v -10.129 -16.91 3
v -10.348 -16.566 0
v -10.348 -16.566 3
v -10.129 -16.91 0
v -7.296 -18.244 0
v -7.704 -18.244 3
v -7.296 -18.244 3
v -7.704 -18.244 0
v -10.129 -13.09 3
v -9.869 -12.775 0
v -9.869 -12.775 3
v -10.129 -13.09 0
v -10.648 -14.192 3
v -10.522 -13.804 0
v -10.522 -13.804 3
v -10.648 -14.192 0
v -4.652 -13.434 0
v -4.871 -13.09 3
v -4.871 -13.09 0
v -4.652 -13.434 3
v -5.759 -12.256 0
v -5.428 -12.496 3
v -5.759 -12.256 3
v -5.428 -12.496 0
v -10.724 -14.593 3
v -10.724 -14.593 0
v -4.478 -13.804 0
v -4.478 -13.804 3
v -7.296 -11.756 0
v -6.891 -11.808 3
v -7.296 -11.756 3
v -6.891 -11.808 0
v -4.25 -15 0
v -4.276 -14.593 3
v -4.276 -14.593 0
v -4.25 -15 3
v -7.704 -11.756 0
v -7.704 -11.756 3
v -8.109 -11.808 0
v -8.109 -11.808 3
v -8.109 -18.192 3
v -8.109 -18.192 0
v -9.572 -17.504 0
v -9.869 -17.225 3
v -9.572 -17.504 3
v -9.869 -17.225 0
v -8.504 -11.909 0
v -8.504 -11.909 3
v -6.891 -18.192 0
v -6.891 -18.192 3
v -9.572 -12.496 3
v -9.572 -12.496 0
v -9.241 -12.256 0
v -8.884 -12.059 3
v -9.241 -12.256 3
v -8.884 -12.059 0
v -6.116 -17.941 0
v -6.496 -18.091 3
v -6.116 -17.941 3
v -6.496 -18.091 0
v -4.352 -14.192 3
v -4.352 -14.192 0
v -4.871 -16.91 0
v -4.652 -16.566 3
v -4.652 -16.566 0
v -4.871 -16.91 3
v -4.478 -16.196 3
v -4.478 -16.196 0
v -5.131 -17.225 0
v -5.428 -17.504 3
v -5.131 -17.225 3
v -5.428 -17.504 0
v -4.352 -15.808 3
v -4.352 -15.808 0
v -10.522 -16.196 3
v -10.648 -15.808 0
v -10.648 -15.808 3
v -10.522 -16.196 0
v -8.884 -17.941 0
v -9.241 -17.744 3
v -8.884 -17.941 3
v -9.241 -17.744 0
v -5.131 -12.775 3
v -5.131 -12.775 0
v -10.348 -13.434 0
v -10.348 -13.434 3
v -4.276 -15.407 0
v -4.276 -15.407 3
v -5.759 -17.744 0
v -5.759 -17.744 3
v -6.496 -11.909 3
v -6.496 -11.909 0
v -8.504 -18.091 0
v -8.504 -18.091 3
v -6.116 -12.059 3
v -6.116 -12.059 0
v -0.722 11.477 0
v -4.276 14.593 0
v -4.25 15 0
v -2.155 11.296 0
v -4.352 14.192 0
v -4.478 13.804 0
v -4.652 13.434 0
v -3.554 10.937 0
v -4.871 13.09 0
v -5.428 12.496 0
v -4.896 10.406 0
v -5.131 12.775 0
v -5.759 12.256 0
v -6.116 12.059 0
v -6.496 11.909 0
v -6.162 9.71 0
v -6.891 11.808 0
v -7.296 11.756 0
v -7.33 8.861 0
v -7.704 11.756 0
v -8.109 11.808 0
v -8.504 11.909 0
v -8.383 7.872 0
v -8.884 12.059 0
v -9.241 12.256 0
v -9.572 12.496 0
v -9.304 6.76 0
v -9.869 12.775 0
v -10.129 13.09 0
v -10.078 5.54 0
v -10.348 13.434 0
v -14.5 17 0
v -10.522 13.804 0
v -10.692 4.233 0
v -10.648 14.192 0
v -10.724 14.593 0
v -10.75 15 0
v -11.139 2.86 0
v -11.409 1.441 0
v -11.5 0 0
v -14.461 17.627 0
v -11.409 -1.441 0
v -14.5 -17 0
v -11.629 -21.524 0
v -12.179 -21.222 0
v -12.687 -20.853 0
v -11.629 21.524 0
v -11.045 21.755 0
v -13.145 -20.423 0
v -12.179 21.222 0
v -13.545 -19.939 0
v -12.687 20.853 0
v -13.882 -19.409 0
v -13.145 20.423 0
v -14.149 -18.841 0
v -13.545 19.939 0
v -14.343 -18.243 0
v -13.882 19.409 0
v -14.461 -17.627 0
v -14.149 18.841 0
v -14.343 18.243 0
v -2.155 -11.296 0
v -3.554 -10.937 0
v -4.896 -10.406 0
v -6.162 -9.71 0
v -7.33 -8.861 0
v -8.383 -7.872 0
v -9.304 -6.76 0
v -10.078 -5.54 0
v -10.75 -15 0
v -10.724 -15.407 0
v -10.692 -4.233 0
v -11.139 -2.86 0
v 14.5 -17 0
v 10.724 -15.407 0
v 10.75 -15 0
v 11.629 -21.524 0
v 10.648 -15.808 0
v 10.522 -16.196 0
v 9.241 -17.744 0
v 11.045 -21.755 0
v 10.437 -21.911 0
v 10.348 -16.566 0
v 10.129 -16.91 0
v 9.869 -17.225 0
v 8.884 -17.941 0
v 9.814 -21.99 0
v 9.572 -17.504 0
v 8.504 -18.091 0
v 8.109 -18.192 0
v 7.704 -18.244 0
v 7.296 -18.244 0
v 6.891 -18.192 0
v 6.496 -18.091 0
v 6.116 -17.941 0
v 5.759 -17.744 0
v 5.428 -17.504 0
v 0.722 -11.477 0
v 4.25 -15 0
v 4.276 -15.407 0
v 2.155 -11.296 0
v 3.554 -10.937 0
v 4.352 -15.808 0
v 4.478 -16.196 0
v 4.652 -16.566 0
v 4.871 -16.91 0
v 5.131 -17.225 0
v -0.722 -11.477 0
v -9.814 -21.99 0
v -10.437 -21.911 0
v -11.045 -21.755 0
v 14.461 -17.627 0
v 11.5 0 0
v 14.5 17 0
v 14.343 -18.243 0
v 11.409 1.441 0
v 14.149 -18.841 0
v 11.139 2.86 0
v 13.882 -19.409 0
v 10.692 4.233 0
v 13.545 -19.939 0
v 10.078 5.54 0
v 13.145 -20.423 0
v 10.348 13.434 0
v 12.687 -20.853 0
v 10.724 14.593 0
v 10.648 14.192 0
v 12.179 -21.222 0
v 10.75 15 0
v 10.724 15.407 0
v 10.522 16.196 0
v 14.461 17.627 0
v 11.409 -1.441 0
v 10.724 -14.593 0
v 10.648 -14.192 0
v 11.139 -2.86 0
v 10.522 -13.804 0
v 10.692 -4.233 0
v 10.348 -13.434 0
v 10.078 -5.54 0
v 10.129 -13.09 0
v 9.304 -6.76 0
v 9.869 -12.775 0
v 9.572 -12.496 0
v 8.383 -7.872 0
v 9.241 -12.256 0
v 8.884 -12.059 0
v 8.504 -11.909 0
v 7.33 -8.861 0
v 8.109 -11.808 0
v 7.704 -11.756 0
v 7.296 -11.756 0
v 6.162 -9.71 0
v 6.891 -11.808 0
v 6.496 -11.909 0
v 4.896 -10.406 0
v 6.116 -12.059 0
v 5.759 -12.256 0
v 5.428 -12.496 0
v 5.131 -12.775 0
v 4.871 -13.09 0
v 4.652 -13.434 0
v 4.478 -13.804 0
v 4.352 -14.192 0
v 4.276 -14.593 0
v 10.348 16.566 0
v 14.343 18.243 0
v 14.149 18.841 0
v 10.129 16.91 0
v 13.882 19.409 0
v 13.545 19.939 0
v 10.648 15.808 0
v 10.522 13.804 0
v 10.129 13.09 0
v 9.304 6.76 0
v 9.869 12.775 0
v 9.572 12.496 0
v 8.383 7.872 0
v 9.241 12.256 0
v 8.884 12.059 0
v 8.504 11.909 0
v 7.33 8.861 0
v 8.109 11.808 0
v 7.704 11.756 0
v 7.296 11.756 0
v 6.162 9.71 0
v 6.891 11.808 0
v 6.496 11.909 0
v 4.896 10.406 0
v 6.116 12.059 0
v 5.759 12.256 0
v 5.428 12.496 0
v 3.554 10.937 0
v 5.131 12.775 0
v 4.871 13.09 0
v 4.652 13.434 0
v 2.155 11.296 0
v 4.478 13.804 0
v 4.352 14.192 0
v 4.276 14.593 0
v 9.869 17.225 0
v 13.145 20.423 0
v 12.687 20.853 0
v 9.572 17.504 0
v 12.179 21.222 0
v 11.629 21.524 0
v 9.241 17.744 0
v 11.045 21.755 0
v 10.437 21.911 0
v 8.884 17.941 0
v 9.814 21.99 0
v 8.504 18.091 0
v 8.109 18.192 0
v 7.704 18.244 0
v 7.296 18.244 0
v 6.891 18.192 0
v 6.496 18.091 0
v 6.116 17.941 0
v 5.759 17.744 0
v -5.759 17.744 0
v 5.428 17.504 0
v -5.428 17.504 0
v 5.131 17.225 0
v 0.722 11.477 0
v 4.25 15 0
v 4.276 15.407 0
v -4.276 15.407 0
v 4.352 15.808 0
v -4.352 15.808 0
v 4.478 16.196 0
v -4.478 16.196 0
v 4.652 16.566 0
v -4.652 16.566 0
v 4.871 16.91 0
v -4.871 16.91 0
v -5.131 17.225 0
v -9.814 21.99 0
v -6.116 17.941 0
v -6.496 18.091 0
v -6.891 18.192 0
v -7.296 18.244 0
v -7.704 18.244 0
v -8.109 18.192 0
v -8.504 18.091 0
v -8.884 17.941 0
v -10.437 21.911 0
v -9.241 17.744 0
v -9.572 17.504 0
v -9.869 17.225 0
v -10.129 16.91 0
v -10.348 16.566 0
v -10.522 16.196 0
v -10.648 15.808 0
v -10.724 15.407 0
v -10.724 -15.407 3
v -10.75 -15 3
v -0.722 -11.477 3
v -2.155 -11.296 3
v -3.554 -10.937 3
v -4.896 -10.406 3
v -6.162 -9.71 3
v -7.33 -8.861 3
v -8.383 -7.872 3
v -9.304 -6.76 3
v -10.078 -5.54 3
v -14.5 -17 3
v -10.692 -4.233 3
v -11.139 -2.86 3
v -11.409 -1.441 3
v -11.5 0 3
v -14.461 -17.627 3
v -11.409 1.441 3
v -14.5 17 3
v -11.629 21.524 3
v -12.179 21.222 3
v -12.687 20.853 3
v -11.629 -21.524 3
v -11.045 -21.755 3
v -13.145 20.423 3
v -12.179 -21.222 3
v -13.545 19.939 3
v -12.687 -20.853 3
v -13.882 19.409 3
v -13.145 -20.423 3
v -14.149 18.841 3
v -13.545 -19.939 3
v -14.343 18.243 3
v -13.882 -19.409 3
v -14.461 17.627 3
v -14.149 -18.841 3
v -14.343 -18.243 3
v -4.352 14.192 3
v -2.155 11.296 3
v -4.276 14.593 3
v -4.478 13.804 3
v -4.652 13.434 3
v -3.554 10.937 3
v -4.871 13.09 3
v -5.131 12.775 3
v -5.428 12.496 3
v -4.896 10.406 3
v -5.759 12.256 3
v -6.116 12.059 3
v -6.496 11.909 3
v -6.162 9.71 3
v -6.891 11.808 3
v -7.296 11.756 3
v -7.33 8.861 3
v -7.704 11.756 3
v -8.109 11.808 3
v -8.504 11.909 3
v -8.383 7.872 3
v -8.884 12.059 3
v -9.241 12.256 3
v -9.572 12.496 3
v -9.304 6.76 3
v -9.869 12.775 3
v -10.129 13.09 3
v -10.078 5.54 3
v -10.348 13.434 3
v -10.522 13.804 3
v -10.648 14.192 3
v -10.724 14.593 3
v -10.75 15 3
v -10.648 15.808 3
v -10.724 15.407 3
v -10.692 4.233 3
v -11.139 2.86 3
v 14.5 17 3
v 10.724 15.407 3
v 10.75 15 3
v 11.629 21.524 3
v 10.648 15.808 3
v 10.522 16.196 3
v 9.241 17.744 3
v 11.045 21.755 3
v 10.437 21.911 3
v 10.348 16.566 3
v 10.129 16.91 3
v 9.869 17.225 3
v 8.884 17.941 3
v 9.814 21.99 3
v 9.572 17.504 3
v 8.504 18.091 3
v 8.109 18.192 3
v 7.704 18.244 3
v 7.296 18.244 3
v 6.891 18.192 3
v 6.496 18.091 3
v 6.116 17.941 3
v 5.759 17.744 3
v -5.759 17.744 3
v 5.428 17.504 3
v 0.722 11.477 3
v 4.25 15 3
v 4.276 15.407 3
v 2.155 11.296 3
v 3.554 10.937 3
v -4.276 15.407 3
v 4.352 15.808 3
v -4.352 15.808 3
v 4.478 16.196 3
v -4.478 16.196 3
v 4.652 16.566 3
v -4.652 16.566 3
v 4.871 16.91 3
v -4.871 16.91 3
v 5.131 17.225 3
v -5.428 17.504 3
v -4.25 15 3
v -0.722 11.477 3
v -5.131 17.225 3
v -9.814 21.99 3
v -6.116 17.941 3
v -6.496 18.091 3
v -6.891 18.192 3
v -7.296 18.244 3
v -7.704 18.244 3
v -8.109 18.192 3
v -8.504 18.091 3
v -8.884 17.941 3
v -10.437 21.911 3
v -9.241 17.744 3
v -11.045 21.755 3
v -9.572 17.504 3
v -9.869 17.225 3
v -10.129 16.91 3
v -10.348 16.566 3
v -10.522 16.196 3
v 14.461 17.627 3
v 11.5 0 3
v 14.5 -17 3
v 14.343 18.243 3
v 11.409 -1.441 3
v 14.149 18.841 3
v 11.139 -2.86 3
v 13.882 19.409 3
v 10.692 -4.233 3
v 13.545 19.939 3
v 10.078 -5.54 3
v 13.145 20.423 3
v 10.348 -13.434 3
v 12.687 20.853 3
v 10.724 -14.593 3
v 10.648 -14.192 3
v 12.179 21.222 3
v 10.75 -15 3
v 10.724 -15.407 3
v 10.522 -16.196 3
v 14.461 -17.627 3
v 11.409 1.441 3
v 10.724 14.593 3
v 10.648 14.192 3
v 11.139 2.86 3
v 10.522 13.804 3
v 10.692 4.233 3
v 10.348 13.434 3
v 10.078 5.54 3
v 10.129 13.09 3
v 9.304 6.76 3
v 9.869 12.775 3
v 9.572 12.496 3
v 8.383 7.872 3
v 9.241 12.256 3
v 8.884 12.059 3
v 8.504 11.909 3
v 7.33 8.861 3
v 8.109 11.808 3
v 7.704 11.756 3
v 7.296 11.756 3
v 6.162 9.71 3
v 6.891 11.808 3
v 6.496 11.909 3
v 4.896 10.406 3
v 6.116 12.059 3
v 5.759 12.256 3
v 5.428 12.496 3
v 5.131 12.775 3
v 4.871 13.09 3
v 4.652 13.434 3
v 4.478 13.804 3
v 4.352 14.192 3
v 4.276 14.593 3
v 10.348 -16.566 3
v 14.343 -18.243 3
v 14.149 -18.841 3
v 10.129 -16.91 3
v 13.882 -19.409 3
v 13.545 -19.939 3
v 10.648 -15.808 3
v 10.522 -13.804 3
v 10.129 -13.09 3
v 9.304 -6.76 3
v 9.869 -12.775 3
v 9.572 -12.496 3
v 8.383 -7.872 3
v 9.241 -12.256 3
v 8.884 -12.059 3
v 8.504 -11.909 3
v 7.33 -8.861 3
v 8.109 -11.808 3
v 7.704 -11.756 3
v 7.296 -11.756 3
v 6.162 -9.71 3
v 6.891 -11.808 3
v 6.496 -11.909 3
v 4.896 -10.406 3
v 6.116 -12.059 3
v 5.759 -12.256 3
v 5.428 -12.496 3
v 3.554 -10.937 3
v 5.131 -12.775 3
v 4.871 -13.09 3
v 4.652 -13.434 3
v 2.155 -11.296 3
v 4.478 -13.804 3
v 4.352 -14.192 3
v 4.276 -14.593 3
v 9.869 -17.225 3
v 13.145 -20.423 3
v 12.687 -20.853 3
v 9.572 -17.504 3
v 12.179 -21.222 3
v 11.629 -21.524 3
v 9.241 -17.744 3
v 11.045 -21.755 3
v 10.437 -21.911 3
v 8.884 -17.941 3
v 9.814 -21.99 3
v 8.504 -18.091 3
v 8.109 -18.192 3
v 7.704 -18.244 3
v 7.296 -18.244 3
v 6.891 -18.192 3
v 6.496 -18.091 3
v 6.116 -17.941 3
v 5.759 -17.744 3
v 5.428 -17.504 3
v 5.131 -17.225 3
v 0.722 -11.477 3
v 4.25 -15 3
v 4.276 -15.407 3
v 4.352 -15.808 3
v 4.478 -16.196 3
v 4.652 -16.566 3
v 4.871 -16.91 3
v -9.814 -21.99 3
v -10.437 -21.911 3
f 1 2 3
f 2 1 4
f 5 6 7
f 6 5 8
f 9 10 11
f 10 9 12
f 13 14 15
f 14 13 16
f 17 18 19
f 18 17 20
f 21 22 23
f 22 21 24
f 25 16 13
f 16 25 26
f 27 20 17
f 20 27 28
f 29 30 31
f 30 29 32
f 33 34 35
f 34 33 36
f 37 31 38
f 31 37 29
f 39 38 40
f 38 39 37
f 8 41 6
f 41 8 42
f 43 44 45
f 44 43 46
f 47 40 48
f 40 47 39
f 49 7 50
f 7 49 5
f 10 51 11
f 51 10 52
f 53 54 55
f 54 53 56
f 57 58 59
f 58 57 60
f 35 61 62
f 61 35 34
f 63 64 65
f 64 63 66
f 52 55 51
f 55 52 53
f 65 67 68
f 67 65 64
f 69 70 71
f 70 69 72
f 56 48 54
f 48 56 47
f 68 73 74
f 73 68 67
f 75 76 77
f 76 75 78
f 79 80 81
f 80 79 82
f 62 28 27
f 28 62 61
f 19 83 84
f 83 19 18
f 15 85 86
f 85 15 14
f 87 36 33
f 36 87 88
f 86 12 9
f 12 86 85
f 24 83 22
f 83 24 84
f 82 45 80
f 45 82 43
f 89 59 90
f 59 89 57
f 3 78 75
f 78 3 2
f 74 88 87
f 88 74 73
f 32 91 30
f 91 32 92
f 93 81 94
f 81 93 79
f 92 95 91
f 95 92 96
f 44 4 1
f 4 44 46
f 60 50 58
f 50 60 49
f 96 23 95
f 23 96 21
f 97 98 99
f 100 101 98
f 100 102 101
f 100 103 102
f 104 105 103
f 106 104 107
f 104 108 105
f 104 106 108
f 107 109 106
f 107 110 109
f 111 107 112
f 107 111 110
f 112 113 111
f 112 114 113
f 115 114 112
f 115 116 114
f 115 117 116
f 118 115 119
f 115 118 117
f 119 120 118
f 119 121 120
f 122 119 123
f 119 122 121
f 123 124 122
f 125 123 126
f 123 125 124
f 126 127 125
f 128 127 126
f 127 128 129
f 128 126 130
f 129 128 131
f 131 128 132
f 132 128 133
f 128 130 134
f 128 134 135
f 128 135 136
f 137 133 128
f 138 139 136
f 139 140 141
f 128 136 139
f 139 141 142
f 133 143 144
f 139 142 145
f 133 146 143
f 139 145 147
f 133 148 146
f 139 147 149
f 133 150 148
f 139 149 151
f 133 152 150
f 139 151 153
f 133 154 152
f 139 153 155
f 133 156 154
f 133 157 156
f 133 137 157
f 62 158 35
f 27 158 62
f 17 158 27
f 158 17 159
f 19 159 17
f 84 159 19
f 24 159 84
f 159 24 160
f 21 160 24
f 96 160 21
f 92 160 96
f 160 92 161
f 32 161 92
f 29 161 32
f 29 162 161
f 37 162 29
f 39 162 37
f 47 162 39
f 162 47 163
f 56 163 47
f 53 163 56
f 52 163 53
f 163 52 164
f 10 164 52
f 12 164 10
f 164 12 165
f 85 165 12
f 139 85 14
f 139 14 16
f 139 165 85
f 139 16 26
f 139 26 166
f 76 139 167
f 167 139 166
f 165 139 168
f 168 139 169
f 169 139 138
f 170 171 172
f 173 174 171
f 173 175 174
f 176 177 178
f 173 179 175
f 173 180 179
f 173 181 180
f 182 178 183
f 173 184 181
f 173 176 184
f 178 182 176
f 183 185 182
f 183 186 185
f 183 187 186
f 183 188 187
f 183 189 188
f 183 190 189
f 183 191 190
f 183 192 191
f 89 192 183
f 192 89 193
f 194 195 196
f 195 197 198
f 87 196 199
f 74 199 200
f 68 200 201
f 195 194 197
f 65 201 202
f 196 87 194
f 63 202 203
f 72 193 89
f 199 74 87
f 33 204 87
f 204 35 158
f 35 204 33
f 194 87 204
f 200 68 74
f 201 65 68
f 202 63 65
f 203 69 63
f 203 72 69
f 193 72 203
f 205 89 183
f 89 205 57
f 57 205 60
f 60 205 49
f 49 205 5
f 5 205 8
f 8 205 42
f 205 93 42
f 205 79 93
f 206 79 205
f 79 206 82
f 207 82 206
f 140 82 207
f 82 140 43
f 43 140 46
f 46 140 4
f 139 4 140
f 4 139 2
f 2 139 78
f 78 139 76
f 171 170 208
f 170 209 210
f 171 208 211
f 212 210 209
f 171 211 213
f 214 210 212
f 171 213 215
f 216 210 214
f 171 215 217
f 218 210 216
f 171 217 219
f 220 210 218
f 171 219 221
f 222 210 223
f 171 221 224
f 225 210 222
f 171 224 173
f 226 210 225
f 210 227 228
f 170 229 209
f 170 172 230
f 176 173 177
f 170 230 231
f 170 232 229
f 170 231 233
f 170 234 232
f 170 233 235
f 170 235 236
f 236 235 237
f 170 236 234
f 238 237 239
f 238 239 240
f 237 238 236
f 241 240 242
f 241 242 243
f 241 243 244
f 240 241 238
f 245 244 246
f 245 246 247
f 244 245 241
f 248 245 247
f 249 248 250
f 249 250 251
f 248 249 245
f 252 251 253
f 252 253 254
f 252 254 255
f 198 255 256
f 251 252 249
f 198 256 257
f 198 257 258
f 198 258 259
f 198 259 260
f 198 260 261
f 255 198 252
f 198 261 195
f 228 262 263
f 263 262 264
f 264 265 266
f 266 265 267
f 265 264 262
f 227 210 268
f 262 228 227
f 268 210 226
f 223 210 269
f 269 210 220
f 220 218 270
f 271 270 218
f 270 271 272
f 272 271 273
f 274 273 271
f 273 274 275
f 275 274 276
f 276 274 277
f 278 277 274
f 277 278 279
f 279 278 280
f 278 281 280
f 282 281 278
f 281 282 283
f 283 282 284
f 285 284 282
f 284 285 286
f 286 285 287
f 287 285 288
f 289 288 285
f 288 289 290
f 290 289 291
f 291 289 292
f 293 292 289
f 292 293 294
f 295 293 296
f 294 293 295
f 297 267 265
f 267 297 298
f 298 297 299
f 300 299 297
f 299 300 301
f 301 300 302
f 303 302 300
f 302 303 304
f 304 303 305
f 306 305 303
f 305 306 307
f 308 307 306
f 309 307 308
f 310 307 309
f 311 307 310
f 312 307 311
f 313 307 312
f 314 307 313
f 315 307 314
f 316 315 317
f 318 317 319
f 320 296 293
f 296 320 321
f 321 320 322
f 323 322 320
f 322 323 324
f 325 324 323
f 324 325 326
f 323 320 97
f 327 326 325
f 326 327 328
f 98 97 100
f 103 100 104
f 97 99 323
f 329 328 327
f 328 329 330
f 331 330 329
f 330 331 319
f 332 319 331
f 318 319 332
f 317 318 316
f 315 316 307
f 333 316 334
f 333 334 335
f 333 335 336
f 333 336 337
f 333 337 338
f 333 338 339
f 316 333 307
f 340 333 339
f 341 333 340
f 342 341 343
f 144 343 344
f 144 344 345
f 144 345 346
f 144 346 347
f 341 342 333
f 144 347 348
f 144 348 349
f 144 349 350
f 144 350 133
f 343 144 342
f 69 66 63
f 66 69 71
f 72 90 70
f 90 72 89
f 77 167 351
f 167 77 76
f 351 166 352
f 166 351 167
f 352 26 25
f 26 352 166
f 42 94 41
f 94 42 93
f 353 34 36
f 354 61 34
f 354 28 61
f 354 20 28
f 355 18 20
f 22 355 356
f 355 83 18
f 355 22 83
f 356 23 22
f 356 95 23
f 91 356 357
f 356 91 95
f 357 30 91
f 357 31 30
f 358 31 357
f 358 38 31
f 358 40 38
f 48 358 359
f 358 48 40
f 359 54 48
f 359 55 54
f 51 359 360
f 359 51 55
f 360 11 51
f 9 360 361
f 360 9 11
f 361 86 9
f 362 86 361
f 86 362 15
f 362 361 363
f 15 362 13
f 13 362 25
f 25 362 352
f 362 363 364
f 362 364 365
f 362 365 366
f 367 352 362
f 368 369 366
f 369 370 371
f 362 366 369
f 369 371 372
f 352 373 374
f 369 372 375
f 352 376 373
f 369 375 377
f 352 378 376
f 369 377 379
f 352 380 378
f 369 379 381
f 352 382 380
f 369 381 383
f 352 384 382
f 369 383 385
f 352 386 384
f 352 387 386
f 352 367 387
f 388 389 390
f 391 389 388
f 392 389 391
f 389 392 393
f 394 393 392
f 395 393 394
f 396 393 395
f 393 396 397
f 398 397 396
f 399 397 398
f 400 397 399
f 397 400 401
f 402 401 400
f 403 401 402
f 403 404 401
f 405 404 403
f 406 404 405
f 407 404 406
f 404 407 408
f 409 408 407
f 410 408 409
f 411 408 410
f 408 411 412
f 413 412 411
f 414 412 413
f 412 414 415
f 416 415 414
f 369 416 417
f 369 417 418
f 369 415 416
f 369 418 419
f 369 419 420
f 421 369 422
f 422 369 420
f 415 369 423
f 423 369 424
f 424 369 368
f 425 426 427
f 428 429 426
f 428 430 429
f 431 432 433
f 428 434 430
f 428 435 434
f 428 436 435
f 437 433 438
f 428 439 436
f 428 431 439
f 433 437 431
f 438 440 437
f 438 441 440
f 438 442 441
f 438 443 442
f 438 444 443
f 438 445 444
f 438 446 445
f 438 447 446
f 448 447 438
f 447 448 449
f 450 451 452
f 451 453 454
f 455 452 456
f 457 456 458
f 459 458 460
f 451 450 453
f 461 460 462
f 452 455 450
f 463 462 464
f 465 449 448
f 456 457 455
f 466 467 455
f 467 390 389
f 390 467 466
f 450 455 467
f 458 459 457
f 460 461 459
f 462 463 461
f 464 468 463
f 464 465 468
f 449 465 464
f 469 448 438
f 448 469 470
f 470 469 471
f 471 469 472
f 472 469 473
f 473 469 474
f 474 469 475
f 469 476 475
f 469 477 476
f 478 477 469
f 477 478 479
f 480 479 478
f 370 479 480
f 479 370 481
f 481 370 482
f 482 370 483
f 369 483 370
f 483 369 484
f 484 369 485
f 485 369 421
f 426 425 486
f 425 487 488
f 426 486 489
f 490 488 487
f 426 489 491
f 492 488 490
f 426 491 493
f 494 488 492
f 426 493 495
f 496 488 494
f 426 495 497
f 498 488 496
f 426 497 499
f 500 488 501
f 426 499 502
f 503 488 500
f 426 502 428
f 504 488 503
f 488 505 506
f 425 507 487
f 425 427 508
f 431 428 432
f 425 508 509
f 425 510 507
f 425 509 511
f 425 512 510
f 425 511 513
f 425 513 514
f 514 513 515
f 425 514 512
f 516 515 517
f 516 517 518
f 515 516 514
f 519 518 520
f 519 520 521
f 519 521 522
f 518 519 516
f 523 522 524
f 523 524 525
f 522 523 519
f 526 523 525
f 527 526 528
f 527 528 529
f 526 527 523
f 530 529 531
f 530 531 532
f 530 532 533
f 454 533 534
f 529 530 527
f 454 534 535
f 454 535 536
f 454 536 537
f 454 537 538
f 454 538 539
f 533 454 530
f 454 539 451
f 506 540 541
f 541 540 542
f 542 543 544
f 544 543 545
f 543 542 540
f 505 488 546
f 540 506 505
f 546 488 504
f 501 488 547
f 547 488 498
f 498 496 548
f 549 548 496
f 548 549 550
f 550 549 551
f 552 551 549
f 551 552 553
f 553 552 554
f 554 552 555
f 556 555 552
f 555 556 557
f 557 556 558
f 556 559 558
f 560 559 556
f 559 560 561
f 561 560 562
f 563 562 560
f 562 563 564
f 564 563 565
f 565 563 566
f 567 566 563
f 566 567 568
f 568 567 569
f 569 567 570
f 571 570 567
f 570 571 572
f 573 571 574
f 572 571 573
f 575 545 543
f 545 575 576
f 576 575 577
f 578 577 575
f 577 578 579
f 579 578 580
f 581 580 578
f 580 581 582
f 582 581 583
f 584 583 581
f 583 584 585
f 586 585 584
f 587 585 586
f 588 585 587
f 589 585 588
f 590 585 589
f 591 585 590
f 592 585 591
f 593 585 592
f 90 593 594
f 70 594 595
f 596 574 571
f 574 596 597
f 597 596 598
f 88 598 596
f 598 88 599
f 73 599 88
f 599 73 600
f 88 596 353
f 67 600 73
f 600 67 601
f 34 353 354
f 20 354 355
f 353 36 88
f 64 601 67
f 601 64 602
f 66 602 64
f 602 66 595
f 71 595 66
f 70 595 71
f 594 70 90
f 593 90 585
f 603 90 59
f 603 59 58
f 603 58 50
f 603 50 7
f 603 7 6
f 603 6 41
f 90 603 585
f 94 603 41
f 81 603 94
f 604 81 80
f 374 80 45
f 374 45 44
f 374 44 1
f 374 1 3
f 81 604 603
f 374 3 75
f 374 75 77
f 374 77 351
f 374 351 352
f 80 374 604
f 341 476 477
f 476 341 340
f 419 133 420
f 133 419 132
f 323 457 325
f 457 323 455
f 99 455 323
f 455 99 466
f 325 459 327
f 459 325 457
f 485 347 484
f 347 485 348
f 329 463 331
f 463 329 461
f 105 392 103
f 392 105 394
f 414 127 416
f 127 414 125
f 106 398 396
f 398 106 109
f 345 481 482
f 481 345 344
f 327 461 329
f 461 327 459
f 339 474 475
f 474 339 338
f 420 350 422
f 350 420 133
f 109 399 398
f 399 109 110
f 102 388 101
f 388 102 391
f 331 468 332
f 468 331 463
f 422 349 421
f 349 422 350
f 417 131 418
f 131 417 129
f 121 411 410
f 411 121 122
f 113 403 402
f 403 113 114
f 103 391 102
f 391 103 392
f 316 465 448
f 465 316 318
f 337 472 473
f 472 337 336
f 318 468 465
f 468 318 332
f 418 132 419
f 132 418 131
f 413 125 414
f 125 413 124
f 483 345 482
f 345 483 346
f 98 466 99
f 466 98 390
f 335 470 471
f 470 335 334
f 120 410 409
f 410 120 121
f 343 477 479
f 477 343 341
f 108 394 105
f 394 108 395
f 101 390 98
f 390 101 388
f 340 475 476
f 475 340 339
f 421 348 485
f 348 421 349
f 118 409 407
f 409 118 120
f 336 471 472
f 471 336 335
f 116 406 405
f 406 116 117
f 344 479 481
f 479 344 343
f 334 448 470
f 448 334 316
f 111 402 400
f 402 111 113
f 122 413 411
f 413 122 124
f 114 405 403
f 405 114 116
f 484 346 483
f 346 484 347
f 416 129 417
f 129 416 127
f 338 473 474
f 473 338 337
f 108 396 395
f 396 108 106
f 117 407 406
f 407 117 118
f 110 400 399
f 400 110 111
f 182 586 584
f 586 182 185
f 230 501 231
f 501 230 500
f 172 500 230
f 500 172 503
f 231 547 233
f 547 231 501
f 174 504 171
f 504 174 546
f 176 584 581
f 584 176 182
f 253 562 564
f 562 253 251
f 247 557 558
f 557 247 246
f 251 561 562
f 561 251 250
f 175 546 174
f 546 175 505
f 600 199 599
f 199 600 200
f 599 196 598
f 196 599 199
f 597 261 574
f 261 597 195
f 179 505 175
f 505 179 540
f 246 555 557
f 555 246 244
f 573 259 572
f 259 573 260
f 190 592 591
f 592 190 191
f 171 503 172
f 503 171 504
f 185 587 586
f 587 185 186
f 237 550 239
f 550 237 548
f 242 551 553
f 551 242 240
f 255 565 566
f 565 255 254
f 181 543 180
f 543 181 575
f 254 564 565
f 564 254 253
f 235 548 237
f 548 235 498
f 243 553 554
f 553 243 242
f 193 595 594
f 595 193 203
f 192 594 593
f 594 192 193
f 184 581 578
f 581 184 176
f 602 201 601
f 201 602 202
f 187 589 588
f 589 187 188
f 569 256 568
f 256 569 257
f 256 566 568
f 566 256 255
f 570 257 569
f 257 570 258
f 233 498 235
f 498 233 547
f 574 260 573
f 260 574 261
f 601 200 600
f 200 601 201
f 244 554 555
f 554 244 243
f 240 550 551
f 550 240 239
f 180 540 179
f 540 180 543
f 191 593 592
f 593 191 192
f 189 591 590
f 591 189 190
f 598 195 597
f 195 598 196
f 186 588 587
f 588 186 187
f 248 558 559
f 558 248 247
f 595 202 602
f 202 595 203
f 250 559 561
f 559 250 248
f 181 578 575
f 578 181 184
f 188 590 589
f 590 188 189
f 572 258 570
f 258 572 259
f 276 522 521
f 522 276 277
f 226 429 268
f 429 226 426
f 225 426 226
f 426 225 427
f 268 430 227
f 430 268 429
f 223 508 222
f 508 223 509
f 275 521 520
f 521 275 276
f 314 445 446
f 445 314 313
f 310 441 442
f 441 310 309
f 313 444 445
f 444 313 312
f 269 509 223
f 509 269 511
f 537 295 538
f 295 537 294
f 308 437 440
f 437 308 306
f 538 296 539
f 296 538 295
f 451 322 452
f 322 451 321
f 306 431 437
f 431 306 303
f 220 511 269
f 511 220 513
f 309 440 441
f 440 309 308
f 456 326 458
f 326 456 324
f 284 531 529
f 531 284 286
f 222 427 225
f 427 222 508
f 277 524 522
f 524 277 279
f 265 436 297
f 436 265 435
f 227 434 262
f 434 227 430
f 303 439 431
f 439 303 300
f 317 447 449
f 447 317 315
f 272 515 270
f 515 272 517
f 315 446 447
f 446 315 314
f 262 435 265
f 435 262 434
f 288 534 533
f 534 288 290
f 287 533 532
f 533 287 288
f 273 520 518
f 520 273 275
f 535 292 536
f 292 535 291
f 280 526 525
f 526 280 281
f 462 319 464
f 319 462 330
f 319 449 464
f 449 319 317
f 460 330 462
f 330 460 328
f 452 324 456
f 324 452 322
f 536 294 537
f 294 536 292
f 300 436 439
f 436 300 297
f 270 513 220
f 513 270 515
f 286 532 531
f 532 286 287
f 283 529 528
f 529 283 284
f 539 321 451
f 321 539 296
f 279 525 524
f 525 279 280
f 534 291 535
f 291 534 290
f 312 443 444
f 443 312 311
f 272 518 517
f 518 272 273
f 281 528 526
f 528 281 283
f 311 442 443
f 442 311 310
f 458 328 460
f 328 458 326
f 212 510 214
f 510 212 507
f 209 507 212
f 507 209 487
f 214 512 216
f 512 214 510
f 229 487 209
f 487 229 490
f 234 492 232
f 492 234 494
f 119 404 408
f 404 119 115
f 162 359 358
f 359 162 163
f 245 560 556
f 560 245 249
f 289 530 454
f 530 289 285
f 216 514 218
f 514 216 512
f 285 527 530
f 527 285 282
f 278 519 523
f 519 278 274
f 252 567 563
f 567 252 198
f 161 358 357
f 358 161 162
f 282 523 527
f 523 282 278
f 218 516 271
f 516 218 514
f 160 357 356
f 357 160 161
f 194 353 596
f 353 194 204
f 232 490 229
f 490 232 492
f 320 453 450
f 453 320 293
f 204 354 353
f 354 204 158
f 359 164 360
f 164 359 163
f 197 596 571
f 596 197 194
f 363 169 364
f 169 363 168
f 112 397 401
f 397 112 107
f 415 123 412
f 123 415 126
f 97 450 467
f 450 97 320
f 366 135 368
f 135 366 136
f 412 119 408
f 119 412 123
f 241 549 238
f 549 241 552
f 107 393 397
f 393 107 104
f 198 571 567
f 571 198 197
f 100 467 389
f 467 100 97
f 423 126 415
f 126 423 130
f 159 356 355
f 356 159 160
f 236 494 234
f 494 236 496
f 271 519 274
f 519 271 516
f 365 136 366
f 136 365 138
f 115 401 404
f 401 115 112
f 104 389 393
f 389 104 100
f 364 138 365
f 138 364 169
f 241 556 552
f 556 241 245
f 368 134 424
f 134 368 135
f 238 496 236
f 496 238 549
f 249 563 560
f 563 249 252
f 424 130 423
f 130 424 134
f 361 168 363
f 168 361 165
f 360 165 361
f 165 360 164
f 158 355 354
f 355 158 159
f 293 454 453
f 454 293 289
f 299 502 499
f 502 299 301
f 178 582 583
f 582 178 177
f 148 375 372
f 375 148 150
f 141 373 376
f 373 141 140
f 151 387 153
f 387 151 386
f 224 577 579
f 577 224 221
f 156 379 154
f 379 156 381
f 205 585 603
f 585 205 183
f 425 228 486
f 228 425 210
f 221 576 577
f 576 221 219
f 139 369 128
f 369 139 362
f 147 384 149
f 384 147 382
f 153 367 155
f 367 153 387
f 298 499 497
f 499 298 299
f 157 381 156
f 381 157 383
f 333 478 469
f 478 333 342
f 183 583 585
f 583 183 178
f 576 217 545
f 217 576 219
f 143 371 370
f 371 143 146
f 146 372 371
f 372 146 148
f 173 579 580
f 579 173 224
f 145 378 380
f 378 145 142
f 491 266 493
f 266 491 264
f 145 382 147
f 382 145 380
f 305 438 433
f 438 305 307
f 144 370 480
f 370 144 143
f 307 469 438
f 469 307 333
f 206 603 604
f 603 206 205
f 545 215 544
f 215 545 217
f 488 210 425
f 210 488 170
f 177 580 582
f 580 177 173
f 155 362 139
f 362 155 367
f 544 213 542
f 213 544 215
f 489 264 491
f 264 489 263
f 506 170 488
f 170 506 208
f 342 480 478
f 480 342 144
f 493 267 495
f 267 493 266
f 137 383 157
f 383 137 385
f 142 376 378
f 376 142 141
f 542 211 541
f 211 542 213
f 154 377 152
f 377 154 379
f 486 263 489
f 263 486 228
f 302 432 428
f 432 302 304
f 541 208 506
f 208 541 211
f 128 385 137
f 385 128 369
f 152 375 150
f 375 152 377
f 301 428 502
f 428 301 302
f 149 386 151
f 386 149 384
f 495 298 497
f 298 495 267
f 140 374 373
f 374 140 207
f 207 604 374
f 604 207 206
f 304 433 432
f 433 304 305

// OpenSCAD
$fn = 50;

difference() {
	union() {
		hull() {
			translate(v = [-9.5, 17.0, 0]) {
				cylinder(h = 3, r = 5);
			}
			translate(v = [9.5, 17.0, 0]) {
				cylinder(h = 3, r = 5);
			}
			translate(v = [-9.5, -17.0, 0]) {
				cylinder(h = 3, r = 5);
			}
			translate(v = [9.5, -17.0, 0]) {
				cylinder(h = 3, r = 5);
			}
		}
	}
	union() {
		translate(v = [-7.5, -15.0, 0]) {
			cylinder(h = 3, r = 3.25);
		}
		translate(v = [-7.5, 15.0, 0]) {
			cylinder(h = 3, r = 3.25);
		}
		translate(v = [7.5, -15.0, 0]) {
			cylinder(h = 3, r = 3.25);
		}
		translate(v = [7.5, 15.0, 0]) {
			cylinder(h = 3, r = 3.25);
		}
		cylinder(h = 3, r = 11.5);
	}
}
